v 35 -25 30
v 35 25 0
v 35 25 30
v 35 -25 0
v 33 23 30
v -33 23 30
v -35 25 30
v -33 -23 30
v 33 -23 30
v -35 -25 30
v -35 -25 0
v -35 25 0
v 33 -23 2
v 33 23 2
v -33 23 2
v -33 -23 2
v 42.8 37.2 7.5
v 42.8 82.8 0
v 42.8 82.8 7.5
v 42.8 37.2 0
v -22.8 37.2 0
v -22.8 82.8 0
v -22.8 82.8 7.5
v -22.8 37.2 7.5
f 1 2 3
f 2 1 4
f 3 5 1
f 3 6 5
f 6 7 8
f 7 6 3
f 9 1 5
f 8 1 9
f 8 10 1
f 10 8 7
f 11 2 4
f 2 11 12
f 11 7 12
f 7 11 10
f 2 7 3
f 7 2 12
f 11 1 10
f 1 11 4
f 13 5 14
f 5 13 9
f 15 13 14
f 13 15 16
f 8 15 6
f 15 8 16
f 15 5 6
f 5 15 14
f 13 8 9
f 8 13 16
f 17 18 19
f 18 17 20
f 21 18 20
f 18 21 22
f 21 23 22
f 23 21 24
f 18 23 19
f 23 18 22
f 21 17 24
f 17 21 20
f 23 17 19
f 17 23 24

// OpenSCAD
// Two-part enclosure for small electronics board
// Print orientation: box standing on bed, lid upside down (plate on bed)

$fn = 64;

// ---- Box ----
box_x = 70;      // outer length (X)
box_y = 50;      // outer width (Y)
box_z = 30;      // outer height (Z)
wall = 2;        // wall thickness
floor = 2;       // floor thickness

// ---- Lid ----
lip_w = 65.6;    // lip outer length (X)
lip_d = 45.6;    // lip outer width (Y)
lip_h = 1.5;     // lip height (wall thickness)
lip_t = 4;       // lip top thickness

// ---- Misc ----
eps = 0.5;       // cutter overshoot
gap = 10;        // gap between parts on bed

// Derived
inner_x = box_x - 2*wall;
inner_y = box_y - 2*wall;
lip_total_h = lip_h + lip_t;   // lip top at z = floor + lip_total_h

module box() {
    difference() {
        translate([-box_x/2, -box_y/2, 0])
            cube([box_x, box_y, box_z]);
        translate([-inner_x/2, -inner_y/2, floor])
            cube([inner_x, inner_y, box_z - floor + eps]); // open top
    }
}

module lid() {
    translate([gap - lip_w/2, -lip_d/2, 0])
        union() {
            // Plate
            cube([lip_w, lip_d, 2]);
            // Lip
            translate([0, 0, 2])
                cube([lip_w, lip_d, lip_total_h]);
        }
}

box();
translate([0, box_y + gap, 0])
    lid();
